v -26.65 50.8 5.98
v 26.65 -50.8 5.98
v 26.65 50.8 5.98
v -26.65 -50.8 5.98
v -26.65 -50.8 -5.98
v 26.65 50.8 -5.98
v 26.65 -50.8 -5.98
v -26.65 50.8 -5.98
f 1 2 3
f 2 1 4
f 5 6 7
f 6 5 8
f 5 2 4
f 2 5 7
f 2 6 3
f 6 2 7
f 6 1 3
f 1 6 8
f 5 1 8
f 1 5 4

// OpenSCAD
// Mega 
cube([53.3, 101.6, 11.96], center = true); // height non-official.  Dimensions exclude USB socket sticking out. 

/*  Pin Out and how to make it work
54 digital I/O pins, 15 of which can be used as 8-bit PWM outputs and 5 provide interrupts.  
16 analogue inputs of 10-bits each.  An analogue input can be used as a comparator to callibrate the levels for a digital input that is not exactly 0 and 5v.  Saves on op amps complexity and reliability impact. 
4 UARTS (hardware serial ports)
ICSP Header

USB Power - is via A plug to B plug cable from Raspberry Pi

1) Select Board under Tools >> Board >> Arduion Mega 2560
2) Select Serial Port under Tools >> Serial Port >> /dev/tty.usbmodem262471  or /dev/tty.usbmodem1421
3) Select Processor under Tools >> Processor


*/
